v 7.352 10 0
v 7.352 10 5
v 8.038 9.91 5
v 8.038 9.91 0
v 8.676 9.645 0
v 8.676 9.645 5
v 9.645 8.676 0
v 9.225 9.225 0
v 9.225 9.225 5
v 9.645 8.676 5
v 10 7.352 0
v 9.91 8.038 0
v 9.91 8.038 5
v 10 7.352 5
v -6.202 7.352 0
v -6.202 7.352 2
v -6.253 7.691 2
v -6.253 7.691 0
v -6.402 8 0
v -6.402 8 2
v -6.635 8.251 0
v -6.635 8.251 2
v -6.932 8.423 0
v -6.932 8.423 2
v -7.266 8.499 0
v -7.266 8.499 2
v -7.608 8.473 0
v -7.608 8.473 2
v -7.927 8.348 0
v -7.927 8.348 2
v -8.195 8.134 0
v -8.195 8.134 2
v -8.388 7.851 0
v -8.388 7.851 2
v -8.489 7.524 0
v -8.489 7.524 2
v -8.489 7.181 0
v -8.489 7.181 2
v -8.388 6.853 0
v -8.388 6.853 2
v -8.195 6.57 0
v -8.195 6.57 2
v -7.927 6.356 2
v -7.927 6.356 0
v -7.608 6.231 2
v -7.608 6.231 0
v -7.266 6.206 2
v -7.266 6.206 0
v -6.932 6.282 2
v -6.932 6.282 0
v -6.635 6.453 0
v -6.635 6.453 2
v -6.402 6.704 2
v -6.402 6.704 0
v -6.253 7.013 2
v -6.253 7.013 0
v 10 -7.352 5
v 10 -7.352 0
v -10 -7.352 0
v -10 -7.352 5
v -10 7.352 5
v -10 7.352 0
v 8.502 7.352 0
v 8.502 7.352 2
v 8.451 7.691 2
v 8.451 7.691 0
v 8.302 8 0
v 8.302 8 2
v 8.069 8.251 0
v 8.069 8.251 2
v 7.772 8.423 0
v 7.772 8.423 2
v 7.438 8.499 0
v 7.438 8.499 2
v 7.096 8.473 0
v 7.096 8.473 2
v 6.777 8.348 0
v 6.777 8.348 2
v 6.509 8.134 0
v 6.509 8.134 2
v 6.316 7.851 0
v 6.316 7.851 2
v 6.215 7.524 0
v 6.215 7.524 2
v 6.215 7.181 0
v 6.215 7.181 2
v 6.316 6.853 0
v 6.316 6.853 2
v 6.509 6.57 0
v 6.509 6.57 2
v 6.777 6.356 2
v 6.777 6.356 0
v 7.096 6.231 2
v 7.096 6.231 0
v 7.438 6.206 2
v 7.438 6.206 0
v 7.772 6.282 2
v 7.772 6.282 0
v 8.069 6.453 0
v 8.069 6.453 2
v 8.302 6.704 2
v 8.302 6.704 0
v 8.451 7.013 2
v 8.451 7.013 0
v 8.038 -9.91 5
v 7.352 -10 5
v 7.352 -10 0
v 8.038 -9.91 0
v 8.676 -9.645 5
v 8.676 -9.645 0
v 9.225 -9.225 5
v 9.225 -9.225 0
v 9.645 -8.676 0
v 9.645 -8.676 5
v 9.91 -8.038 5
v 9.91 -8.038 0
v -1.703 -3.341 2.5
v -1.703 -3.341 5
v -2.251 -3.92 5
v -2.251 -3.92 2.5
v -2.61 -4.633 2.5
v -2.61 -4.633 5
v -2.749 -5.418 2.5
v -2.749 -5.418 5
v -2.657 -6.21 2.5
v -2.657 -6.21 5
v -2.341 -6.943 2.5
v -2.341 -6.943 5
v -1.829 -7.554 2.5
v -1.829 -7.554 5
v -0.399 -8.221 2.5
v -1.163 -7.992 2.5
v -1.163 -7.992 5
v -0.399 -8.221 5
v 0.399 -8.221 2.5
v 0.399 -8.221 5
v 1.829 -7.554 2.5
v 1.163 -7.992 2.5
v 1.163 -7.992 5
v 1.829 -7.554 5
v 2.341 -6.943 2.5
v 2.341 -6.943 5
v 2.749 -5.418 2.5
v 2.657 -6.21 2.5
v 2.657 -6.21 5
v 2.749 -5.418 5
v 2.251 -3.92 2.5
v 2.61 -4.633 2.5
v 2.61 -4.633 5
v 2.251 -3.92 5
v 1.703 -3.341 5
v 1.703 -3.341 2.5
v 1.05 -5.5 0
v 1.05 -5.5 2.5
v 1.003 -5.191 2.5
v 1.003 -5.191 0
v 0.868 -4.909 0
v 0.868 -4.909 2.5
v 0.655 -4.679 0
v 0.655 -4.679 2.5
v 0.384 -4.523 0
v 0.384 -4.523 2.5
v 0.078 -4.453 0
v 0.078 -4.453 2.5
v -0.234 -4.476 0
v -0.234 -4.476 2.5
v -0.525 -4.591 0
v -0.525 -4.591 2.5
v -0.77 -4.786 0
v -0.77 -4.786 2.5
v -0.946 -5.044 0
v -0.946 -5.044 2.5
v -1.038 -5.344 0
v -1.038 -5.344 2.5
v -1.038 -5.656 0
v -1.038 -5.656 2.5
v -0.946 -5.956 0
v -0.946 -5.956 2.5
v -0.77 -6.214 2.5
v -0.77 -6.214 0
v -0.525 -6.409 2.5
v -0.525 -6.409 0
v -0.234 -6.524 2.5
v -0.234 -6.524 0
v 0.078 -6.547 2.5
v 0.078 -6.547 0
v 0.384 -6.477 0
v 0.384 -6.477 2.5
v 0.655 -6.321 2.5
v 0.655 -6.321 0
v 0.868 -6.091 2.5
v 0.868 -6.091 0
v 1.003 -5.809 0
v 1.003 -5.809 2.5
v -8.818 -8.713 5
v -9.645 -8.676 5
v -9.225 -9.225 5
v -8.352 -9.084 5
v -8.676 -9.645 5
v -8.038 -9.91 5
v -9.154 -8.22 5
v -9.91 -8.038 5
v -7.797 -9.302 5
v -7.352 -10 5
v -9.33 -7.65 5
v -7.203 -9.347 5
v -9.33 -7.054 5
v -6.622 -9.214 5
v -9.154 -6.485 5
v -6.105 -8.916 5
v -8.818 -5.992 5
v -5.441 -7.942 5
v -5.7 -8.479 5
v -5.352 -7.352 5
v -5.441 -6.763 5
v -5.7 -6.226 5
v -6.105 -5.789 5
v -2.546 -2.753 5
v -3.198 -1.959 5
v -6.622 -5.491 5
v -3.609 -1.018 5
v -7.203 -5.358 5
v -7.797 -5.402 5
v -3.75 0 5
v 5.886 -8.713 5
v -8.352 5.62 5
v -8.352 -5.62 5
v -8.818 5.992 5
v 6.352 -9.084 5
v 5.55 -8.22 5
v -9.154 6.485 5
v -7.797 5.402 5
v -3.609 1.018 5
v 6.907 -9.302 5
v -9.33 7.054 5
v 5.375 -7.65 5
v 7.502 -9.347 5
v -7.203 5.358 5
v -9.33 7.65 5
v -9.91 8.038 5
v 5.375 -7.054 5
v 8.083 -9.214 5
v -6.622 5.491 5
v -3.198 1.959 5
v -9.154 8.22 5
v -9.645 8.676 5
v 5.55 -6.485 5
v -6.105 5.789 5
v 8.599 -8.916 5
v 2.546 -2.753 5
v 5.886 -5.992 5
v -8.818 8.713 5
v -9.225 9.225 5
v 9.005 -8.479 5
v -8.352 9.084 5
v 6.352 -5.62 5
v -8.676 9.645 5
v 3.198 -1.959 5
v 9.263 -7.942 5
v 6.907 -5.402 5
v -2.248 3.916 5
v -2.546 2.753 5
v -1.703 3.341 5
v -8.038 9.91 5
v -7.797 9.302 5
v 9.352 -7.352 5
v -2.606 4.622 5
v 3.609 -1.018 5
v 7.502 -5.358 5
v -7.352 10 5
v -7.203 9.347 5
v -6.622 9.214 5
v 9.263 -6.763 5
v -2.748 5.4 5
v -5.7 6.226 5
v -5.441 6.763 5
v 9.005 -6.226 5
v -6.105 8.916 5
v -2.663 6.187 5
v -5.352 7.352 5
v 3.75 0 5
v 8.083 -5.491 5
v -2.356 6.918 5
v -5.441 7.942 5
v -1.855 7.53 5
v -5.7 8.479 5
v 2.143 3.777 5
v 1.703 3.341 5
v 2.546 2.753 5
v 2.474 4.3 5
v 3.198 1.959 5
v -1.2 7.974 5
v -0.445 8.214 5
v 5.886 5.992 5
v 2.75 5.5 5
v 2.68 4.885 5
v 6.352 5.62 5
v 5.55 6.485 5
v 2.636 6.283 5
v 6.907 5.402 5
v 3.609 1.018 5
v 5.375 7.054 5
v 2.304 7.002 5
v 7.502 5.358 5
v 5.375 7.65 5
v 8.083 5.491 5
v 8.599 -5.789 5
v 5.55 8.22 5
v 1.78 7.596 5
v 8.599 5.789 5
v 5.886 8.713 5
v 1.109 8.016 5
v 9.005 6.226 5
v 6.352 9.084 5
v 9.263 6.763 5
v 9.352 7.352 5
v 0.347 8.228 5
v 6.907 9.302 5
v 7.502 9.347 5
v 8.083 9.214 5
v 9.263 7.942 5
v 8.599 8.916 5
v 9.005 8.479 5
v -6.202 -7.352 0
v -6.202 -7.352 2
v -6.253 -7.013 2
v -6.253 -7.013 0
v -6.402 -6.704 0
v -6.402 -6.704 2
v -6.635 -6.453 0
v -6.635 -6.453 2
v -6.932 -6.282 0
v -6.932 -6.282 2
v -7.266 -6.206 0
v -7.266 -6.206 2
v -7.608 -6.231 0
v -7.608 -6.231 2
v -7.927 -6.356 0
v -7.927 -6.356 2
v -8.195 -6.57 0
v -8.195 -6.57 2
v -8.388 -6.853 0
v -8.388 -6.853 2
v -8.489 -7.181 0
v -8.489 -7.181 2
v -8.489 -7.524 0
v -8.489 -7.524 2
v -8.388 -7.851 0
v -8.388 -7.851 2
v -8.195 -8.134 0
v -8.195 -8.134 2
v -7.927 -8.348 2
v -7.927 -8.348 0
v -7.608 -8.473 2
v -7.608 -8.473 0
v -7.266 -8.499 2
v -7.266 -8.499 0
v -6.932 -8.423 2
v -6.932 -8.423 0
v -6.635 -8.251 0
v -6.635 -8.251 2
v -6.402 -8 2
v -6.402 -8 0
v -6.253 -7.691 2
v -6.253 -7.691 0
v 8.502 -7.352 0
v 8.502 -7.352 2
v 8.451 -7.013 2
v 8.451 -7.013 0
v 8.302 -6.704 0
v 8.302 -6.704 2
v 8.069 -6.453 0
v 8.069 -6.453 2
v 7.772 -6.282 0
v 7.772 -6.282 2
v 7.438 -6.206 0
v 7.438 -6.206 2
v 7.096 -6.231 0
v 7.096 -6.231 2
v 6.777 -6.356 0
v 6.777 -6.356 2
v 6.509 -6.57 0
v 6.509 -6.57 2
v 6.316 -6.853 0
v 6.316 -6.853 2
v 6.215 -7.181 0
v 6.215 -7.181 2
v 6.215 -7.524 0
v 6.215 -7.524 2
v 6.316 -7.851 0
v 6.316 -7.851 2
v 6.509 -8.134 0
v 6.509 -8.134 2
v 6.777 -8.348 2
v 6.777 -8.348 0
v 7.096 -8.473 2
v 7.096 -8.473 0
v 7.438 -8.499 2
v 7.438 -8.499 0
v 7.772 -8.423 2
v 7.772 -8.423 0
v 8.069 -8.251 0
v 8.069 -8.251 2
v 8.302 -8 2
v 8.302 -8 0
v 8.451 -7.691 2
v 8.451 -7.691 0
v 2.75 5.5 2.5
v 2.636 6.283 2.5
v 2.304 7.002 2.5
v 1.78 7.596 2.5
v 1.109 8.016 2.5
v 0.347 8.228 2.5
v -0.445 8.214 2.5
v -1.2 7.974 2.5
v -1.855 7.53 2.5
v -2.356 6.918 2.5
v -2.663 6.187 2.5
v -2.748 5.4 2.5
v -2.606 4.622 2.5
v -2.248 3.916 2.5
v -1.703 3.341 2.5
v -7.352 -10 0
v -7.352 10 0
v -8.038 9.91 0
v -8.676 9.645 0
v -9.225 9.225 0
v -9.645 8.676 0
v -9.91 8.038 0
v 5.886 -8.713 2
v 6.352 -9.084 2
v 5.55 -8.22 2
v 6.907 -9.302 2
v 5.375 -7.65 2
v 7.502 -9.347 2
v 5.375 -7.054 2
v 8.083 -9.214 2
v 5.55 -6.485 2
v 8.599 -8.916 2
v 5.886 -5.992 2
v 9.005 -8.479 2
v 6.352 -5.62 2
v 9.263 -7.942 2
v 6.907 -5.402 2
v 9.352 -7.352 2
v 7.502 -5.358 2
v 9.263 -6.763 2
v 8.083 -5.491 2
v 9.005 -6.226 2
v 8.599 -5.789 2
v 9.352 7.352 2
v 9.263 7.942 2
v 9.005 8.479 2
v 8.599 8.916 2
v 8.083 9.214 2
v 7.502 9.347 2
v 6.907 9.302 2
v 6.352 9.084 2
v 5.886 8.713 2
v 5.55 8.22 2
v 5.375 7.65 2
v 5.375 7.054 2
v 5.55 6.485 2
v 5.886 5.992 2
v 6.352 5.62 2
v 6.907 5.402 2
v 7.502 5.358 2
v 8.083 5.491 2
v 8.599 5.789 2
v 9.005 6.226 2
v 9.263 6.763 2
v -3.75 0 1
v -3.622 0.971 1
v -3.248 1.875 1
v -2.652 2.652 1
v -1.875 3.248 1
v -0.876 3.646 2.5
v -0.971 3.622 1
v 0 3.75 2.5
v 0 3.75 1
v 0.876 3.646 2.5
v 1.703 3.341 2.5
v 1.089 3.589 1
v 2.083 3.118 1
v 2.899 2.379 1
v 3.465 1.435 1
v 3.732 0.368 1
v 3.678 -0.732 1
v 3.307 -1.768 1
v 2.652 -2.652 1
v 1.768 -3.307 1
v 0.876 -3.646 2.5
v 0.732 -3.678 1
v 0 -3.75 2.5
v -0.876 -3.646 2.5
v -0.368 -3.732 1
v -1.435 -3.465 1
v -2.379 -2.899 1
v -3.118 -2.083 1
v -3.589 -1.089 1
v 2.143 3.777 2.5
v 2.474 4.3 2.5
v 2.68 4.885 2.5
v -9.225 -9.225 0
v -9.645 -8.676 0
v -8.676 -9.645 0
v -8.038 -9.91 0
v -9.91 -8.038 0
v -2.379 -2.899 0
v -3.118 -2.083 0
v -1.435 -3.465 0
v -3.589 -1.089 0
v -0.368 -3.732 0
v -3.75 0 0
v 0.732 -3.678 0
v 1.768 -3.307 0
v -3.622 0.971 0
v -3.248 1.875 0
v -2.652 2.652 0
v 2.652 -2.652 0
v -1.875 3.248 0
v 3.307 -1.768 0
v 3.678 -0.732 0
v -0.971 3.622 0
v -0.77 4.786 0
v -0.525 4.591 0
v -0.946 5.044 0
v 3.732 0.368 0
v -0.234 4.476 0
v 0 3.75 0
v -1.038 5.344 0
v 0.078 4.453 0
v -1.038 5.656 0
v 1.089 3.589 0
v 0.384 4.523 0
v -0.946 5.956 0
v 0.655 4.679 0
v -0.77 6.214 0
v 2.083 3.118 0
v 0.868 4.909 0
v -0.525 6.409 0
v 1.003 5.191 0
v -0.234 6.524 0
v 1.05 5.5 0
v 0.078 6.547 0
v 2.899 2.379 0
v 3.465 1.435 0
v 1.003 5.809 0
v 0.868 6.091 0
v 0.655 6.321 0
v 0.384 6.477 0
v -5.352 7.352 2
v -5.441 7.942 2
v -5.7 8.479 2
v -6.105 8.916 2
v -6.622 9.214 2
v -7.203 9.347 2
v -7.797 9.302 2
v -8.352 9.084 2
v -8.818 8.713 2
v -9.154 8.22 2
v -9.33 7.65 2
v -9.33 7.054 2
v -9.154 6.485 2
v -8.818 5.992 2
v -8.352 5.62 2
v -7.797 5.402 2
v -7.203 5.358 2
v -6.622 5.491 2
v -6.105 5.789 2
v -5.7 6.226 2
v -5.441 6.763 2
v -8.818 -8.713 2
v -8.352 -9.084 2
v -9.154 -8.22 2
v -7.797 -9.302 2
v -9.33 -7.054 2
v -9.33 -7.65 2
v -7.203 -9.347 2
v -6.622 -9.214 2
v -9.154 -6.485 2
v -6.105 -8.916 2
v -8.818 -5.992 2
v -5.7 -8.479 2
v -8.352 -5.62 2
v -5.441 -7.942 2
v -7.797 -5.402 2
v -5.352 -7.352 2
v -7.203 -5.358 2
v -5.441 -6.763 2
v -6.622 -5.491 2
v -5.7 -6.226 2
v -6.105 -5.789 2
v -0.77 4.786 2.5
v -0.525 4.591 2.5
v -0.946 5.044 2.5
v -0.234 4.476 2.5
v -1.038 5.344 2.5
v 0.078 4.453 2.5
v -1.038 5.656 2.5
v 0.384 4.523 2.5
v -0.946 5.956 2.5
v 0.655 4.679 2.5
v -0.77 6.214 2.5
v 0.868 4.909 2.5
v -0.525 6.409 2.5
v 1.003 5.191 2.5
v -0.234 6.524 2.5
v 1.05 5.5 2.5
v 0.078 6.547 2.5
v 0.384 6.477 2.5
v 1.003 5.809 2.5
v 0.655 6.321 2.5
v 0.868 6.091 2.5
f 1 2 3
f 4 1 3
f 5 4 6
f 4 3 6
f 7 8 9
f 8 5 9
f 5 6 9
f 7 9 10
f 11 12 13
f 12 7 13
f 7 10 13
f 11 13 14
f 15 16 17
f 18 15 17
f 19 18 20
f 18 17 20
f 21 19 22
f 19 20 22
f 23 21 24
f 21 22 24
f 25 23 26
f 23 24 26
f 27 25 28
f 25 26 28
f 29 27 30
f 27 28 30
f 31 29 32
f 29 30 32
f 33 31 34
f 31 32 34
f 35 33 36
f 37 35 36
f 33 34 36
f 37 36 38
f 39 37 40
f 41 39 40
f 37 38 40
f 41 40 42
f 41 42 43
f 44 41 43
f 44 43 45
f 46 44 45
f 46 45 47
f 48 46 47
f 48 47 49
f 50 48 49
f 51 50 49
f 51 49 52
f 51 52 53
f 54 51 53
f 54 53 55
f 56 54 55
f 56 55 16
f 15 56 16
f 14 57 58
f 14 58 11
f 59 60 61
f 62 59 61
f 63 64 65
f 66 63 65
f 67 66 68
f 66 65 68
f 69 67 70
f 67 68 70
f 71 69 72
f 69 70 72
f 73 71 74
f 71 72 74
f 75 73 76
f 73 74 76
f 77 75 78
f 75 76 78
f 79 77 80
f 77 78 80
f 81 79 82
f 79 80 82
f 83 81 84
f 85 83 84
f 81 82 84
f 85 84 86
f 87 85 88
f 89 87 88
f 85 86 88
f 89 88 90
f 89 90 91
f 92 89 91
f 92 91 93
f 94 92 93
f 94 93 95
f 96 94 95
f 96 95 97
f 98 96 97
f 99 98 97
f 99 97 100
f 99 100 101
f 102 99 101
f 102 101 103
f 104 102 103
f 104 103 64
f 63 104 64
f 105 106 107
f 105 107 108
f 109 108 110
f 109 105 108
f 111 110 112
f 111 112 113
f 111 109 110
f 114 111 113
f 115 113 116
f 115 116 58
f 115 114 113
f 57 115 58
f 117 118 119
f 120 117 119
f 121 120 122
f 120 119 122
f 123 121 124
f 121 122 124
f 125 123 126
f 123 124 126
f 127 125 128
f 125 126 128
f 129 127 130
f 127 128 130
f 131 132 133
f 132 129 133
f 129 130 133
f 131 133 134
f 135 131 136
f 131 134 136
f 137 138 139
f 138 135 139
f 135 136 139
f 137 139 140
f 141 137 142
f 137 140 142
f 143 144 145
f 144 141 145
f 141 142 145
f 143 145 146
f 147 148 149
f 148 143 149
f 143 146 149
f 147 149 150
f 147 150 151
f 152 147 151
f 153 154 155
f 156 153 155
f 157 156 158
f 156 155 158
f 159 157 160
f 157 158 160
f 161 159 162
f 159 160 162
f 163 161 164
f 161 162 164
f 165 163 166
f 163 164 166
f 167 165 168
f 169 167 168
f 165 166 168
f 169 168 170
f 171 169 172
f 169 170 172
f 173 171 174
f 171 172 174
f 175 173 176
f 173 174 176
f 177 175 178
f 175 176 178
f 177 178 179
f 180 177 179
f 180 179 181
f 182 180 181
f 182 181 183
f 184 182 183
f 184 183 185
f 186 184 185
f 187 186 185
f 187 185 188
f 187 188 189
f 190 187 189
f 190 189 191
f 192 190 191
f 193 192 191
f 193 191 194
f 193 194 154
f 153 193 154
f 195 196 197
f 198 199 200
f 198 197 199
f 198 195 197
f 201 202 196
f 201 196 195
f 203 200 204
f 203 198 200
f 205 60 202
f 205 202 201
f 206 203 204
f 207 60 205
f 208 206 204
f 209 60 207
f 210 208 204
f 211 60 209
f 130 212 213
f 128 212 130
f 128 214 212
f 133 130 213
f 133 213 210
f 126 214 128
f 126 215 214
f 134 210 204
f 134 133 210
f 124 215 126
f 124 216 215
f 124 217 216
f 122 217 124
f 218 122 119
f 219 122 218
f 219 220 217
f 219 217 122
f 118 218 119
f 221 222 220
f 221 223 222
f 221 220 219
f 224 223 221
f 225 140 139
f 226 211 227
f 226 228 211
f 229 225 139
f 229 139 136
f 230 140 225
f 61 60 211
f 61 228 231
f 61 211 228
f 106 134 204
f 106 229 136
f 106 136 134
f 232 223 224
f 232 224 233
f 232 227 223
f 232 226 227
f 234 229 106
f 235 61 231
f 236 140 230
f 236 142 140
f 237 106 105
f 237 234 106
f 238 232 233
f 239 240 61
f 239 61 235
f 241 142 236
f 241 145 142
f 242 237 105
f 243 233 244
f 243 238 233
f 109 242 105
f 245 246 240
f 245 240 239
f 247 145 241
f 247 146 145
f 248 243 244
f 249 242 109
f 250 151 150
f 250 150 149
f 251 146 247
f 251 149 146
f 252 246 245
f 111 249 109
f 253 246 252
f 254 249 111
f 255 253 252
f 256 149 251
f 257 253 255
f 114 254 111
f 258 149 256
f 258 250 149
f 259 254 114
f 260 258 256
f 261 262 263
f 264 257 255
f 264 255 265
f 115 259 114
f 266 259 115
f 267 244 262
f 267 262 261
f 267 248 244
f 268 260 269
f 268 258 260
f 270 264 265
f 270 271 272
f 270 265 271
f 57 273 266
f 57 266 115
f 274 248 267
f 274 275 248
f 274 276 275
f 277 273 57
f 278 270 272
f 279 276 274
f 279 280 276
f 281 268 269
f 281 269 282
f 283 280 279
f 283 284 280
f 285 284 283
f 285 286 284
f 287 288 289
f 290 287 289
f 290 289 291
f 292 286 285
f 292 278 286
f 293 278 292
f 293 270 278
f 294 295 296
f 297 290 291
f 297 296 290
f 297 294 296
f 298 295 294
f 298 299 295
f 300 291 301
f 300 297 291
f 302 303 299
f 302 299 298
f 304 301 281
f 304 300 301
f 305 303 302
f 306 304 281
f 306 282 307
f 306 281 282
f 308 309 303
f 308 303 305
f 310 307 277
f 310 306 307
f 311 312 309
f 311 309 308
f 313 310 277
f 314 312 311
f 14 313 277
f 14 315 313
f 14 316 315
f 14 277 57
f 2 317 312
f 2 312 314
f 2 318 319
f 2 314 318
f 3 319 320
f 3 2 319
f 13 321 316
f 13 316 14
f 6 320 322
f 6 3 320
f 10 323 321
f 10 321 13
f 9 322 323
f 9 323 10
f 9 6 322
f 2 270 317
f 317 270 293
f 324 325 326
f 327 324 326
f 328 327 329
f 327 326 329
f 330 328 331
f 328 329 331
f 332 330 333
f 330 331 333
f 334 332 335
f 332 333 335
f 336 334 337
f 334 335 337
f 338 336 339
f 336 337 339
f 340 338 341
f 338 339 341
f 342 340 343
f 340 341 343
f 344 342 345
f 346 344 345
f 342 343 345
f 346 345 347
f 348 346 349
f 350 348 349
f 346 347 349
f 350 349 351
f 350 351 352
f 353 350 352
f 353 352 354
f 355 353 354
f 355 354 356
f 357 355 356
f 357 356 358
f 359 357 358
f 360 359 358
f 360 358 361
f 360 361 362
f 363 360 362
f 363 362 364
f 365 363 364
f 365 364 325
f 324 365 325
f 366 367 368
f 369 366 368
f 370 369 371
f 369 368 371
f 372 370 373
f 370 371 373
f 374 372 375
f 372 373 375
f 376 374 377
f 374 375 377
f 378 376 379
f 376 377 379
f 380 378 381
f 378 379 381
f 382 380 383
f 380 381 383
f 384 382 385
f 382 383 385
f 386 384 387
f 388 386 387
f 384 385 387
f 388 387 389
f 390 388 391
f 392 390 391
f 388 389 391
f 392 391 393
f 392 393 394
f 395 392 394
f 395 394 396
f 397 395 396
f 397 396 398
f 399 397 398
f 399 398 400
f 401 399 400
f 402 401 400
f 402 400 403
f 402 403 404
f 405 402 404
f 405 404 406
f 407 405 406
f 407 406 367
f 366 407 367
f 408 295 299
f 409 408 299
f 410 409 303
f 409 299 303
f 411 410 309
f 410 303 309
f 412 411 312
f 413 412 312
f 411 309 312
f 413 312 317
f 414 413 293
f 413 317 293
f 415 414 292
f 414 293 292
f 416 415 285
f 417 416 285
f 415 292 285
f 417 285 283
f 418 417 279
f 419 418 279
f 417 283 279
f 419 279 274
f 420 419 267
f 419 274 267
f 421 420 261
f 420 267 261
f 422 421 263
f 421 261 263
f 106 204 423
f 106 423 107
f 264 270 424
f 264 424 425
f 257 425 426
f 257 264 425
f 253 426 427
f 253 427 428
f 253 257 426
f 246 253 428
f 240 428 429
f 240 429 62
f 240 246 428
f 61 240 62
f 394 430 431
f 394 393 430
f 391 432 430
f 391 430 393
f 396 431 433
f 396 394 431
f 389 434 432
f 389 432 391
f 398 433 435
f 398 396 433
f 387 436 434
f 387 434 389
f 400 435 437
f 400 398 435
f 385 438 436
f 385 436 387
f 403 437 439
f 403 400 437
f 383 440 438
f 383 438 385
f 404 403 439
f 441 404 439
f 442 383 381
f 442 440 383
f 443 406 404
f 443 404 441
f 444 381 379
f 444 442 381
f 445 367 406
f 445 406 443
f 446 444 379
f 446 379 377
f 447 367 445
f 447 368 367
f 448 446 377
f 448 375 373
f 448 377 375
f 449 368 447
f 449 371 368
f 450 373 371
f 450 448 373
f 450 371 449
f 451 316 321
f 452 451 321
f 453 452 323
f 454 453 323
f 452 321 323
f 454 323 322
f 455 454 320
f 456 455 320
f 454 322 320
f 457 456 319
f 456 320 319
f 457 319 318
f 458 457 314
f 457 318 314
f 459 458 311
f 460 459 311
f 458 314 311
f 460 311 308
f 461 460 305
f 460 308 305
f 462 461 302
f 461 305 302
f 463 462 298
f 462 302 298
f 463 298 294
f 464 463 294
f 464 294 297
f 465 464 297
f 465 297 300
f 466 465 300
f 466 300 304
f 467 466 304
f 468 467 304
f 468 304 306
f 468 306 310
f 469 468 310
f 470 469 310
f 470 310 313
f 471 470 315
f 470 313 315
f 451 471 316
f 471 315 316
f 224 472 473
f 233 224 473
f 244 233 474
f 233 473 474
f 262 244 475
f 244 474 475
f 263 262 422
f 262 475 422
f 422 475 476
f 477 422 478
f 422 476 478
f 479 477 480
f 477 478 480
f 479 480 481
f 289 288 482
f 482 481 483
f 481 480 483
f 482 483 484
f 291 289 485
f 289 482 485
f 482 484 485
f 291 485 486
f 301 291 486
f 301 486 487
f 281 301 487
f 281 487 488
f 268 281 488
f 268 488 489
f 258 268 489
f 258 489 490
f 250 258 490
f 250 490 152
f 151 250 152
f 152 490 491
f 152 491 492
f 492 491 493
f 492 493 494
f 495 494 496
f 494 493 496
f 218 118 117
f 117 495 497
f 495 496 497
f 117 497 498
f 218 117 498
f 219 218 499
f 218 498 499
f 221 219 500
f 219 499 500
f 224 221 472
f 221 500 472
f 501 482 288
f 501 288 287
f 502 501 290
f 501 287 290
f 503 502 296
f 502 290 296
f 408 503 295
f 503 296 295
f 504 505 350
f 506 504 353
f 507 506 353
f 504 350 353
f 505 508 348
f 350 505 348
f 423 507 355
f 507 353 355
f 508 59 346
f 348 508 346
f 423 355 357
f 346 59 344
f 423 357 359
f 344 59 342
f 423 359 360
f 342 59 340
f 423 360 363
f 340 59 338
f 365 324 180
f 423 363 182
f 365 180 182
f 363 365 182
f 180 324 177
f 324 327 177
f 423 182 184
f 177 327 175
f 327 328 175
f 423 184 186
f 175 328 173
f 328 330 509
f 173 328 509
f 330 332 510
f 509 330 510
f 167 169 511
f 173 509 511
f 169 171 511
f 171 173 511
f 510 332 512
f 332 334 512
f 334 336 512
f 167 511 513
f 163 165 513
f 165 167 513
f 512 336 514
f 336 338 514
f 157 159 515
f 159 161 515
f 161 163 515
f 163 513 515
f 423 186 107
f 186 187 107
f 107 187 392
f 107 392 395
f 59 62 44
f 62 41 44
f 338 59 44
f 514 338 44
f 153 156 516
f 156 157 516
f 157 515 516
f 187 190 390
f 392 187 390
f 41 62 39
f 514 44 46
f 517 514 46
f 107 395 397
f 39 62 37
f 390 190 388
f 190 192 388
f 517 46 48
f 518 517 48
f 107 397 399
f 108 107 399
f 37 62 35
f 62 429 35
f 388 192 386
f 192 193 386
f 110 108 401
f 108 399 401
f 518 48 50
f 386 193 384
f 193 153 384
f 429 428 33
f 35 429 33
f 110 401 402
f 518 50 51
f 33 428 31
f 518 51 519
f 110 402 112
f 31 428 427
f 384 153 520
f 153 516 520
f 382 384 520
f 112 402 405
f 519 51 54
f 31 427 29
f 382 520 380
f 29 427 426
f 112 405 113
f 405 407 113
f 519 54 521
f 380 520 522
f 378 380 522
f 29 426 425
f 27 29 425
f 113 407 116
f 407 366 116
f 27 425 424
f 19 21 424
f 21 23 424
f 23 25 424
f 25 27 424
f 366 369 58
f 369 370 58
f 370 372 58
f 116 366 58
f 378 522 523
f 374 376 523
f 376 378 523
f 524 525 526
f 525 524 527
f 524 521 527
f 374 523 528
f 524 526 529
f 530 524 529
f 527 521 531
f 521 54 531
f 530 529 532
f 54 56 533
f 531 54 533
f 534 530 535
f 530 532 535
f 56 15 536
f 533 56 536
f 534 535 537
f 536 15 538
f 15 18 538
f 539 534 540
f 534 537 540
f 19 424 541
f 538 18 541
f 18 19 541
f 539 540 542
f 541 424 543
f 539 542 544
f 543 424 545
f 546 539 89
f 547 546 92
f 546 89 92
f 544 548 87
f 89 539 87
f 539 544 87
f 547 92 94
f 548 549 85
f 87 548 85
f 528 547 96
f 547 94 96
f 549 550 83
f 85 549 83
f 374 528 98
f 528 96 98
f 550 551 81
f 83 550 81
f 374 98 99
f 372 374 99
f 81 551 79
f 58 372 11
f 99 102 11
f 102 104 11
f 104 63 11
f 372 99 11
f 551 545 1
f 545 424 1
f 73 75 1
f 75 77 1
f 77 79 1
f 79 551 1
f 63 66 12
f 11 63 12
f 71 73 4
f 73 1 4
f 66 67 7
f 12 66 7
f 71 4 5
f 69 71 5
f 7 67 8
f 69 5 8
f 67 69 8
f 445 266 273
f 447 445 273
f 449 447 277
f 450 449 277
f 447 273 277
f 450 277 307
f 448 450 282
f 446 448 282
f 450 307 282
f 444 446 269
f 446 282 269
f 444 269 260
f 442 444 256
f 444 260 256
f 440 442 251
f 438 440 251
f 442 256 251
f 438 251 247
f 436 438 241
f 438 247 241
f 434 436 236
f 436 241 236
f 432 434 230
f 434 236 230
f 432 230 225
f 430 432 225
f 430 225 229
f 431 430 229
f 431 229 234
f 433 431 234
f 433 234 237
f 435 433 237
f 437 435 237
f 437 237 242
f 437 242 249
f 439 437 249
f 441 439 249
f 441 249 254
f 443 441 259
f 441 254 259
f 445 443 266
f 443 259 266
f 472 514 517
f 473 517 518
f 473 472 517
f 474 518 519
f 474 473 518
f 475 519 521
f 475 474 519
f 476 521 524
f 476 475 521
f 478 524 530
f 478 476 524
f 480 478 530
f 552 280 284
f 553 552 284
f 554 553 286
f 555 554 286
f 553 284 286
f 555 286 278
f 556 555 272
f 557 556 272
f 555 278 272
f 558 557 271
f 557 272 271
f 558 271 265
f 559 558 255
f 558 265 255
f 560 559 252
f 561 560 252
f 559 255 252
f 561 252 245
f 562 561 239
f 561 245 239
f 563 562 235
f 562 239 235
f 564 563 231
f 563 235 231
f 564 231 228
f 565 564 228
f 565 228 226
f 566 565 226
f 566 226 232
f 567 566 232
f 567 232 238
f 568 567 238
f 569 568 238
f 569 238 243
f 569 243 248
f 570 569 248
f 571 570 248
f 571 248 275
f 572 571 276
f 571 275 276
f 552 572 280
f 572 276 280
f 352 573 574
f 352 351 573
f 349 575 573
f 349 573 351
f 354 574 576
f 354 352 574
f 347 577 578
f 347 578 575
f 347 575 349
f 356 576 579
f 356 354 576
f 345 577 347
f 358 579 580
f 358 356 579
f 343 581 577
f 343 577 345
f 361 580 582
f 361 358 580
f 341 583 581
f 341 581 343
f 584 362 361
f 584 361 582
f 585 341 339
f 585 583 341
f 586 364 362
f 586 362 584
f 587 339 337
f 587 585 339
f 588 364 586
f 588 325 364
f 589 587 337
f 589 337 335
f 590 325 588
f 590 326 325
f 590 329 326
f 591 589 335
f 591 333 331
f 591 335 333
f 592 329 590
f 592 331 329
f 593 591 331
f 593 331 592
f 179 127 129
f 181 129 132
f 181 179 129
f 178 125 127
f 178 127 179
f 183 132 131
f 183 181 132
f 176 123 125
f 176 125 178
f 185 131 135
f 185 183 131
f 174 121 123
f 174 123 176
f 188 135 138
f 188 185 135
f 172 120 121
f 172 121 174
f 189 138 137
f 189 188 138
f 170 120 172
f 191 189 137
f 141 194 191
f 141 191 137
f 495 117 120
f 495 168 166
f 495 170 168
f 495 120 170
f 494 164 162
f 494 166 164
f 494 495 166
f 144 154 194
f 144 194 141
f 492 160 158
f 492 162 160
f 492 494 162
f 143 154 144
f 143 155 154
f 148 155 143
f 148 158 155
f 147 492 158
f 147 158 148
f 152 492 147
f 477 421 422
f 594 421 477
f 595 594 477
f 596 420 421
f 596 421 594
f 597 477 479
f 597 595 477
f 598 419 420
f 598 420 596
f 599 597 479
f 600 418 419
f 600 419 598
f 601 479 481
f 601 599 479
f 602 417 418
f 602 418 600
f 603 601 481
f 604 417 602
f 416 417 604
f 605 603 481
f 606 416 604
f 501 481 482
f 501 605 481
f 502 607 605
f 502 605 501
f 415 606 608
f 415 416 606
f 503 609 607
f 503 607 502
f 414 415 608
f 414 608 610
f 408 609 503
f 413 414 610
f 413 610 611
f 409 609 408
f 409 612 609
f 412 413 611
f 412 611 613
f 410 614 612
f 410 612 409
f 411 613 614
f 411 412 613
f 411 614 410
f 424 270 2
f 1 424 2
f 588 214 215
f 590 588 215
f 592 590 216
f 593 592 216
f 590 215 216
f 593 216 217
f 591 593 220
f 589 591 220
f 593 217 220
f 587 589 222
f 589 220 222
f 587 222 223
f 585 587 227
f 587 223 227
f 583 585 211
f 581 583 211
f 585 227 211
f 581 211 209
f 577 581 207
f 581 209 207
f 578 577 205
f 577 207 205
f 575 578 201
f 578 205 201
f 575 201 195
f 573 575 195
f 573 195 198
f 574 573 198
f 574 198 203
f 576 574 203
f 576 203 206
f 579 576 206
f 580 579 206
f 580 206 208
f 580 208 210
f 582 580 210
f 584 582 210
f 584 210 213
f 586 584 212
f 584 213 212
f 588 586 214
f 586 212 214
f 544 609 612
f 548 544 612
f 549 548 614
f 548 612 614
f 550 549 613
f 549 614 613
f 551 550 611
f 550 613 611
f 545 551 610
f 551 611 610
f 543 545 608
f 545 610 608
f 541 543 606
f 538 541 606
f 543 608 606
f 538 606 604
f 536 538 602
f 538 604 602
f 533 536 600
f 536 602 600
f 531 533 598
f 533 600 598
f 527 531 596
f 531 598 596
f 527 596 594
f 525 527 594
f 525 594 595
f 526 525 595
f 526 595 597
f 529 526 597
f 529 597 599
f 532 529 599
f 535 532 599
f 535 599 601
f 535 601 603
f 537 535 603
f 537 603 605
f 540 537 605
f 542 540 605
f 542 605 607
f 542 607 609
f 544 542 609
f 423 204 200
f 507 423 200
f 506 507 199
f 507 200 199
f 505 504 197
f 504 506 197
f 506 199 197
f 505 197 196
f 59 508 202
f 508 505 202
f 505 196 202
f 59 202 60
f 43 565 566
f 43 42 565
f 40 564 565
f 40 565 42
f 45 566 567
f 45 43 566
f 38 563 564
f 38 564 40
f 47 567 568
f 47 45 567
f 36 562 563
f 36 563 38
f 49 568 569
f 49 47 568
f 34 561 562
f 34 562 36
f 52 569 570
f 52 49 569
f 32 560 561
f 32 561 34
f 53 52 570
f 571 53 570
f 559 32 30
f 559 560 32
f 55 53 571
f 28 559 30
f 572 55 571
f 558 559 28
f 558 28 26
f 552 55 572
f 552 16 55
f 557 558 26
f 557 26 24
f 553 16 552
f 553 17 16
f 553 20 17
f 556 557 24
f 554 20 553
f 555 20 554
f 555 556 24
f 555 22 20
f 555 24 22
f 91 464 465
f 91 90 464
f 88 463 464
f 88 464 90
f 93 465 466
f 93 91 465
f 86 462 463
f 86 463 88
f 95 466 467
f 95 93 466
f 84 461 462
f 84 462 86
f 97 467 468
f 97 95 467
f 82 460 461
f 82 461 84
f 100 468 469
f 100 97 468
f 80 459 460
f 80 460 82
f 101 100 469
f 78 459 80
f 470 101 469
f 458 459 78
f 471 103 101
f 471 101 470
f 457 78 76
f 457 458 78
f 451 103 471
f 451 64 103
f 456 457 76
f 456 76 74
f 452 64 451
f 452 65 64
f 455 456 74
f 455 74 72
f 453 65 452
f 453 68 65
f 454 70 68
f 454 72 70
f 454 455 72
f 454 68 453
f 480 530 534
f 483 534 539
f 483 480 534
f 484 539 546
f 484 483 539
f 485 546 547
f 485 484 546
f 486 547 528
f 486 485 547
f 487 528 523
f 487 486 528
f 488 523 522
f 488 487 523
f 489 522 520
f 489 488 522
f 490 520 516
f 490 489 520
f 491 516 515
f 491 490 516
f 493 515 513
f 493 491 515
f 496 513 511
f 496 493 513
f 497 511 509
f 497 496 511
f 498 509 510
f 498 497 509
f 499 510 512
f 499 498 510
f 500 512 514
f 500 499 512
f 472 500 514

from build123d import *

# Parameters (mm, degrees)
SKIZZE3_W                       = 20
SKIZZE3_H                       = 20
SKIZZE3_R                       = 7.5
AUFSATZ_LINEAR_AUSTRAGEN2_DEPTH = 5
SKIZZE4_R                       = 1.05
SCHNITT_LINEAR_AUSTRAGEN1_DEPTH = 6
SKIZZE5_R                       = 2.75
SCHNITT_LINEAR_AUSTRAGEN2_DEPTH = 2.5
SCHNITT_LINEAR_AUSTRAGEN3_DEPTH = 6
SKIZZE7_R                       = 1.15
SCHNITT_LINEAR_AUSTRAGEN4_DEPTH = 6
SKIZZE8_R                       = 2
SCHNITT_LINEAR_AUSTRAGEN5_DEPTH = 3
SKIZZE10_R                      = 3.75
SCHNITT_LINEAR_AUSTRAGEN6_DEPTH = 6


with BuildPart() as part:
    # Skizze2 → Rotation1 (revolve)
    with BuildSketch(Plane(origin=(0, 0, 0), x_dir=(0, 0, -1), z_dir=(1, 0, 0))):
        Polygon((0, 3.75), (-1, 3.75), (-1, 3.25), (-2.6, 3.25), (-2.6, 2), (-5, 2), (-5, 7.5), (0, 7.5), align=None)
    revolve(axis=Axis((0, 0, 12.6), (0, 0, -1)))

    # Skizze3 → Aufsatz-Linear austragen2 (add, through all)
    with BuildSketch(Plane.XY.offset(5)):
        Rectangle(SKIZZE3_W, SKIZZE3_H)
        Circle(SKIZZE3_R, mode=Mode.SUBTRACT)
    extrude(amount=-AUFSATZ_LINEAR_AUSTRAGEN2_DEPTH)

    # Skizze4 → Schnitt-Linear austragen1 (cut, through all)
    with BuildSketch(Plane.XY.offset(5)):
        with Locations((0, 5.5)):
            Circle(SKIZZE4_R)
        with Locations((0, -5.5)):
            Circle(SKIZZE4_R)
    extrude(amount=-SCHNITT_LINEAR_AUSTRAGEN1_DEPTH, mode=Mode.SUBTRACT)

    # Skizze5 → Schnitt-Linear austragen2 (cut)
    with BuildSketch(Plane.XY.offset(5)):
        with Locations((0, 5.5)):
            Circle(SKIZZE5_R)
        with Locations((0, -5.5)):
            Circle(SKIZZE5_R)
    extrude(amount=-SCHNITT_LINEAR_AUSTRAGEN2_DEPTH, mode=Mode.SUBTRACT)

    # Skizze6 → Schnitt-Linear austragen3 (cut, through all)
    with BuildSketch(Plane.XY.offset(5)):
        with BuildLine():
            Line((-10, 7.352290732), (-10.887824638, 7.352290732))
            Line((-10.887824638, 7.352290732), (-10.887824638, 10.887824638))
            Line((-10.887824638, 10.887824638), (-7.352290732, 10.887824638))
            Line((-7.352290732, 10.887824638), (-7.352290732, 10))
            ThreePointArc((-7.352290732, 10), (-9.22450391, 9.22450391), (-10, 7.352290732))
        make_face()
        with BuildLine():
            Line((7.352290732, 10.887824638), (7.352290732, 10))
            ThreePointArc((7.352290732, 10), (9.22450391, 9.22450391), (10, 7.352290732))
            Line((10, 7.352290732), (10.887824638, 7.352290732))
            Line((10.887824638, 7.352290732), (10.887824638, 10.887824638))
            Line((10.887824638, 10.887824638), (7.352290732, 10.887824638))
        make_face()
        with BuildLine():
            Line((10, -7.352290732), (10.887824638, -7.352290732))
            Line((10.887824638, -7.352290732), (10.887824638, -10.887824638))
            Line((10.887824638, -10.887824638), (7.352290732, -10.887824638))
            Line((7.352290732, -10.887824638), (7.352290732, -10))
            ThreePointArc((7.352290732, -10), (9.22450391, -9.22450391), (10, -7.352290732))
        make_face()
        with BuildLine():
            Line((-7.352290732, -10.887824638), (-7.352290732, -10))
            ThreePointArc((-7.352290732, -10), (-9.22450391, -9.22450391), (-10, -7.352290732))
            Line((-10, -7.352290732), (-10.887824638, -7.352290732))
            Line((-10.887824638, -7.352290732), (-10.887824638, -10.887824638))
            Line((-10.887824638, -10.887824638), (-7.352290732, -10.887824638))
        make_face()
    extrude(amount=-SCHNITT_LINEAR_AUSTRAGEN3_DEPTH, mode=Mode.SUBTRACT)

    # Skizze7 → Schnitt-Linear austragen4 (cut, through all)
    with BuildSketch(Plane.XY.offset(5)):
        with Locations((-7.352290732, 7.352290732)):
            Circle(SKIZZE7_R)
        with Locations((7.352290732, 7.352290732)):
            Circle(SKIZZE7_R)
        with Locations((7.352290732, -7.352290732)):
            Circle(SKIZZE7_R)
        with Locations((-7.352290732, -7.352290732)):
            Circle(SKIZZE7_R)
    extrude(amount=-SCHNITT_LINEAR_AUSTRAGEN4_DEPTH, mode=Mode.SUBTRACT)

    # Skizze8 → Schnitt-Linear austragen5 (cut)
    with BuildSketch(Plane.XY.offset(5)):
        with Locations((-7.352290732, 7.352290732)):
            Circle(SKIZZE8_R)
        with Locations((7.352290732, 7.352290732)):
            Circle(SKIZZE8_R)
        with Locations((7.352290732, -7.352290732)):
            Circle(SKIZZE8_R)
        with Locations((-7.352290732, -7.352290732)):
            Circle(SKIZZE8_R)
    extrude(amount=-SCHNITT_LINEAR_AUSTRAGEN5_DEPTH, mode=Mode.SUBTRACT)

    # Skizze10 → Schnitt-Linear austragen6 (cut, through all)
    with BuildSketch(Plane(origin=(0, 0, 0), x_dir=(-1, 0, 0), z_dir=(0, 0, -1))):
        Circle(SKIZZE10_R)
    extrude(amount=-SCHNITT_LINEAR_AUSTRAGEN6_DEPTH, mode=Mode.SUBTRACT)


solid = part.part
